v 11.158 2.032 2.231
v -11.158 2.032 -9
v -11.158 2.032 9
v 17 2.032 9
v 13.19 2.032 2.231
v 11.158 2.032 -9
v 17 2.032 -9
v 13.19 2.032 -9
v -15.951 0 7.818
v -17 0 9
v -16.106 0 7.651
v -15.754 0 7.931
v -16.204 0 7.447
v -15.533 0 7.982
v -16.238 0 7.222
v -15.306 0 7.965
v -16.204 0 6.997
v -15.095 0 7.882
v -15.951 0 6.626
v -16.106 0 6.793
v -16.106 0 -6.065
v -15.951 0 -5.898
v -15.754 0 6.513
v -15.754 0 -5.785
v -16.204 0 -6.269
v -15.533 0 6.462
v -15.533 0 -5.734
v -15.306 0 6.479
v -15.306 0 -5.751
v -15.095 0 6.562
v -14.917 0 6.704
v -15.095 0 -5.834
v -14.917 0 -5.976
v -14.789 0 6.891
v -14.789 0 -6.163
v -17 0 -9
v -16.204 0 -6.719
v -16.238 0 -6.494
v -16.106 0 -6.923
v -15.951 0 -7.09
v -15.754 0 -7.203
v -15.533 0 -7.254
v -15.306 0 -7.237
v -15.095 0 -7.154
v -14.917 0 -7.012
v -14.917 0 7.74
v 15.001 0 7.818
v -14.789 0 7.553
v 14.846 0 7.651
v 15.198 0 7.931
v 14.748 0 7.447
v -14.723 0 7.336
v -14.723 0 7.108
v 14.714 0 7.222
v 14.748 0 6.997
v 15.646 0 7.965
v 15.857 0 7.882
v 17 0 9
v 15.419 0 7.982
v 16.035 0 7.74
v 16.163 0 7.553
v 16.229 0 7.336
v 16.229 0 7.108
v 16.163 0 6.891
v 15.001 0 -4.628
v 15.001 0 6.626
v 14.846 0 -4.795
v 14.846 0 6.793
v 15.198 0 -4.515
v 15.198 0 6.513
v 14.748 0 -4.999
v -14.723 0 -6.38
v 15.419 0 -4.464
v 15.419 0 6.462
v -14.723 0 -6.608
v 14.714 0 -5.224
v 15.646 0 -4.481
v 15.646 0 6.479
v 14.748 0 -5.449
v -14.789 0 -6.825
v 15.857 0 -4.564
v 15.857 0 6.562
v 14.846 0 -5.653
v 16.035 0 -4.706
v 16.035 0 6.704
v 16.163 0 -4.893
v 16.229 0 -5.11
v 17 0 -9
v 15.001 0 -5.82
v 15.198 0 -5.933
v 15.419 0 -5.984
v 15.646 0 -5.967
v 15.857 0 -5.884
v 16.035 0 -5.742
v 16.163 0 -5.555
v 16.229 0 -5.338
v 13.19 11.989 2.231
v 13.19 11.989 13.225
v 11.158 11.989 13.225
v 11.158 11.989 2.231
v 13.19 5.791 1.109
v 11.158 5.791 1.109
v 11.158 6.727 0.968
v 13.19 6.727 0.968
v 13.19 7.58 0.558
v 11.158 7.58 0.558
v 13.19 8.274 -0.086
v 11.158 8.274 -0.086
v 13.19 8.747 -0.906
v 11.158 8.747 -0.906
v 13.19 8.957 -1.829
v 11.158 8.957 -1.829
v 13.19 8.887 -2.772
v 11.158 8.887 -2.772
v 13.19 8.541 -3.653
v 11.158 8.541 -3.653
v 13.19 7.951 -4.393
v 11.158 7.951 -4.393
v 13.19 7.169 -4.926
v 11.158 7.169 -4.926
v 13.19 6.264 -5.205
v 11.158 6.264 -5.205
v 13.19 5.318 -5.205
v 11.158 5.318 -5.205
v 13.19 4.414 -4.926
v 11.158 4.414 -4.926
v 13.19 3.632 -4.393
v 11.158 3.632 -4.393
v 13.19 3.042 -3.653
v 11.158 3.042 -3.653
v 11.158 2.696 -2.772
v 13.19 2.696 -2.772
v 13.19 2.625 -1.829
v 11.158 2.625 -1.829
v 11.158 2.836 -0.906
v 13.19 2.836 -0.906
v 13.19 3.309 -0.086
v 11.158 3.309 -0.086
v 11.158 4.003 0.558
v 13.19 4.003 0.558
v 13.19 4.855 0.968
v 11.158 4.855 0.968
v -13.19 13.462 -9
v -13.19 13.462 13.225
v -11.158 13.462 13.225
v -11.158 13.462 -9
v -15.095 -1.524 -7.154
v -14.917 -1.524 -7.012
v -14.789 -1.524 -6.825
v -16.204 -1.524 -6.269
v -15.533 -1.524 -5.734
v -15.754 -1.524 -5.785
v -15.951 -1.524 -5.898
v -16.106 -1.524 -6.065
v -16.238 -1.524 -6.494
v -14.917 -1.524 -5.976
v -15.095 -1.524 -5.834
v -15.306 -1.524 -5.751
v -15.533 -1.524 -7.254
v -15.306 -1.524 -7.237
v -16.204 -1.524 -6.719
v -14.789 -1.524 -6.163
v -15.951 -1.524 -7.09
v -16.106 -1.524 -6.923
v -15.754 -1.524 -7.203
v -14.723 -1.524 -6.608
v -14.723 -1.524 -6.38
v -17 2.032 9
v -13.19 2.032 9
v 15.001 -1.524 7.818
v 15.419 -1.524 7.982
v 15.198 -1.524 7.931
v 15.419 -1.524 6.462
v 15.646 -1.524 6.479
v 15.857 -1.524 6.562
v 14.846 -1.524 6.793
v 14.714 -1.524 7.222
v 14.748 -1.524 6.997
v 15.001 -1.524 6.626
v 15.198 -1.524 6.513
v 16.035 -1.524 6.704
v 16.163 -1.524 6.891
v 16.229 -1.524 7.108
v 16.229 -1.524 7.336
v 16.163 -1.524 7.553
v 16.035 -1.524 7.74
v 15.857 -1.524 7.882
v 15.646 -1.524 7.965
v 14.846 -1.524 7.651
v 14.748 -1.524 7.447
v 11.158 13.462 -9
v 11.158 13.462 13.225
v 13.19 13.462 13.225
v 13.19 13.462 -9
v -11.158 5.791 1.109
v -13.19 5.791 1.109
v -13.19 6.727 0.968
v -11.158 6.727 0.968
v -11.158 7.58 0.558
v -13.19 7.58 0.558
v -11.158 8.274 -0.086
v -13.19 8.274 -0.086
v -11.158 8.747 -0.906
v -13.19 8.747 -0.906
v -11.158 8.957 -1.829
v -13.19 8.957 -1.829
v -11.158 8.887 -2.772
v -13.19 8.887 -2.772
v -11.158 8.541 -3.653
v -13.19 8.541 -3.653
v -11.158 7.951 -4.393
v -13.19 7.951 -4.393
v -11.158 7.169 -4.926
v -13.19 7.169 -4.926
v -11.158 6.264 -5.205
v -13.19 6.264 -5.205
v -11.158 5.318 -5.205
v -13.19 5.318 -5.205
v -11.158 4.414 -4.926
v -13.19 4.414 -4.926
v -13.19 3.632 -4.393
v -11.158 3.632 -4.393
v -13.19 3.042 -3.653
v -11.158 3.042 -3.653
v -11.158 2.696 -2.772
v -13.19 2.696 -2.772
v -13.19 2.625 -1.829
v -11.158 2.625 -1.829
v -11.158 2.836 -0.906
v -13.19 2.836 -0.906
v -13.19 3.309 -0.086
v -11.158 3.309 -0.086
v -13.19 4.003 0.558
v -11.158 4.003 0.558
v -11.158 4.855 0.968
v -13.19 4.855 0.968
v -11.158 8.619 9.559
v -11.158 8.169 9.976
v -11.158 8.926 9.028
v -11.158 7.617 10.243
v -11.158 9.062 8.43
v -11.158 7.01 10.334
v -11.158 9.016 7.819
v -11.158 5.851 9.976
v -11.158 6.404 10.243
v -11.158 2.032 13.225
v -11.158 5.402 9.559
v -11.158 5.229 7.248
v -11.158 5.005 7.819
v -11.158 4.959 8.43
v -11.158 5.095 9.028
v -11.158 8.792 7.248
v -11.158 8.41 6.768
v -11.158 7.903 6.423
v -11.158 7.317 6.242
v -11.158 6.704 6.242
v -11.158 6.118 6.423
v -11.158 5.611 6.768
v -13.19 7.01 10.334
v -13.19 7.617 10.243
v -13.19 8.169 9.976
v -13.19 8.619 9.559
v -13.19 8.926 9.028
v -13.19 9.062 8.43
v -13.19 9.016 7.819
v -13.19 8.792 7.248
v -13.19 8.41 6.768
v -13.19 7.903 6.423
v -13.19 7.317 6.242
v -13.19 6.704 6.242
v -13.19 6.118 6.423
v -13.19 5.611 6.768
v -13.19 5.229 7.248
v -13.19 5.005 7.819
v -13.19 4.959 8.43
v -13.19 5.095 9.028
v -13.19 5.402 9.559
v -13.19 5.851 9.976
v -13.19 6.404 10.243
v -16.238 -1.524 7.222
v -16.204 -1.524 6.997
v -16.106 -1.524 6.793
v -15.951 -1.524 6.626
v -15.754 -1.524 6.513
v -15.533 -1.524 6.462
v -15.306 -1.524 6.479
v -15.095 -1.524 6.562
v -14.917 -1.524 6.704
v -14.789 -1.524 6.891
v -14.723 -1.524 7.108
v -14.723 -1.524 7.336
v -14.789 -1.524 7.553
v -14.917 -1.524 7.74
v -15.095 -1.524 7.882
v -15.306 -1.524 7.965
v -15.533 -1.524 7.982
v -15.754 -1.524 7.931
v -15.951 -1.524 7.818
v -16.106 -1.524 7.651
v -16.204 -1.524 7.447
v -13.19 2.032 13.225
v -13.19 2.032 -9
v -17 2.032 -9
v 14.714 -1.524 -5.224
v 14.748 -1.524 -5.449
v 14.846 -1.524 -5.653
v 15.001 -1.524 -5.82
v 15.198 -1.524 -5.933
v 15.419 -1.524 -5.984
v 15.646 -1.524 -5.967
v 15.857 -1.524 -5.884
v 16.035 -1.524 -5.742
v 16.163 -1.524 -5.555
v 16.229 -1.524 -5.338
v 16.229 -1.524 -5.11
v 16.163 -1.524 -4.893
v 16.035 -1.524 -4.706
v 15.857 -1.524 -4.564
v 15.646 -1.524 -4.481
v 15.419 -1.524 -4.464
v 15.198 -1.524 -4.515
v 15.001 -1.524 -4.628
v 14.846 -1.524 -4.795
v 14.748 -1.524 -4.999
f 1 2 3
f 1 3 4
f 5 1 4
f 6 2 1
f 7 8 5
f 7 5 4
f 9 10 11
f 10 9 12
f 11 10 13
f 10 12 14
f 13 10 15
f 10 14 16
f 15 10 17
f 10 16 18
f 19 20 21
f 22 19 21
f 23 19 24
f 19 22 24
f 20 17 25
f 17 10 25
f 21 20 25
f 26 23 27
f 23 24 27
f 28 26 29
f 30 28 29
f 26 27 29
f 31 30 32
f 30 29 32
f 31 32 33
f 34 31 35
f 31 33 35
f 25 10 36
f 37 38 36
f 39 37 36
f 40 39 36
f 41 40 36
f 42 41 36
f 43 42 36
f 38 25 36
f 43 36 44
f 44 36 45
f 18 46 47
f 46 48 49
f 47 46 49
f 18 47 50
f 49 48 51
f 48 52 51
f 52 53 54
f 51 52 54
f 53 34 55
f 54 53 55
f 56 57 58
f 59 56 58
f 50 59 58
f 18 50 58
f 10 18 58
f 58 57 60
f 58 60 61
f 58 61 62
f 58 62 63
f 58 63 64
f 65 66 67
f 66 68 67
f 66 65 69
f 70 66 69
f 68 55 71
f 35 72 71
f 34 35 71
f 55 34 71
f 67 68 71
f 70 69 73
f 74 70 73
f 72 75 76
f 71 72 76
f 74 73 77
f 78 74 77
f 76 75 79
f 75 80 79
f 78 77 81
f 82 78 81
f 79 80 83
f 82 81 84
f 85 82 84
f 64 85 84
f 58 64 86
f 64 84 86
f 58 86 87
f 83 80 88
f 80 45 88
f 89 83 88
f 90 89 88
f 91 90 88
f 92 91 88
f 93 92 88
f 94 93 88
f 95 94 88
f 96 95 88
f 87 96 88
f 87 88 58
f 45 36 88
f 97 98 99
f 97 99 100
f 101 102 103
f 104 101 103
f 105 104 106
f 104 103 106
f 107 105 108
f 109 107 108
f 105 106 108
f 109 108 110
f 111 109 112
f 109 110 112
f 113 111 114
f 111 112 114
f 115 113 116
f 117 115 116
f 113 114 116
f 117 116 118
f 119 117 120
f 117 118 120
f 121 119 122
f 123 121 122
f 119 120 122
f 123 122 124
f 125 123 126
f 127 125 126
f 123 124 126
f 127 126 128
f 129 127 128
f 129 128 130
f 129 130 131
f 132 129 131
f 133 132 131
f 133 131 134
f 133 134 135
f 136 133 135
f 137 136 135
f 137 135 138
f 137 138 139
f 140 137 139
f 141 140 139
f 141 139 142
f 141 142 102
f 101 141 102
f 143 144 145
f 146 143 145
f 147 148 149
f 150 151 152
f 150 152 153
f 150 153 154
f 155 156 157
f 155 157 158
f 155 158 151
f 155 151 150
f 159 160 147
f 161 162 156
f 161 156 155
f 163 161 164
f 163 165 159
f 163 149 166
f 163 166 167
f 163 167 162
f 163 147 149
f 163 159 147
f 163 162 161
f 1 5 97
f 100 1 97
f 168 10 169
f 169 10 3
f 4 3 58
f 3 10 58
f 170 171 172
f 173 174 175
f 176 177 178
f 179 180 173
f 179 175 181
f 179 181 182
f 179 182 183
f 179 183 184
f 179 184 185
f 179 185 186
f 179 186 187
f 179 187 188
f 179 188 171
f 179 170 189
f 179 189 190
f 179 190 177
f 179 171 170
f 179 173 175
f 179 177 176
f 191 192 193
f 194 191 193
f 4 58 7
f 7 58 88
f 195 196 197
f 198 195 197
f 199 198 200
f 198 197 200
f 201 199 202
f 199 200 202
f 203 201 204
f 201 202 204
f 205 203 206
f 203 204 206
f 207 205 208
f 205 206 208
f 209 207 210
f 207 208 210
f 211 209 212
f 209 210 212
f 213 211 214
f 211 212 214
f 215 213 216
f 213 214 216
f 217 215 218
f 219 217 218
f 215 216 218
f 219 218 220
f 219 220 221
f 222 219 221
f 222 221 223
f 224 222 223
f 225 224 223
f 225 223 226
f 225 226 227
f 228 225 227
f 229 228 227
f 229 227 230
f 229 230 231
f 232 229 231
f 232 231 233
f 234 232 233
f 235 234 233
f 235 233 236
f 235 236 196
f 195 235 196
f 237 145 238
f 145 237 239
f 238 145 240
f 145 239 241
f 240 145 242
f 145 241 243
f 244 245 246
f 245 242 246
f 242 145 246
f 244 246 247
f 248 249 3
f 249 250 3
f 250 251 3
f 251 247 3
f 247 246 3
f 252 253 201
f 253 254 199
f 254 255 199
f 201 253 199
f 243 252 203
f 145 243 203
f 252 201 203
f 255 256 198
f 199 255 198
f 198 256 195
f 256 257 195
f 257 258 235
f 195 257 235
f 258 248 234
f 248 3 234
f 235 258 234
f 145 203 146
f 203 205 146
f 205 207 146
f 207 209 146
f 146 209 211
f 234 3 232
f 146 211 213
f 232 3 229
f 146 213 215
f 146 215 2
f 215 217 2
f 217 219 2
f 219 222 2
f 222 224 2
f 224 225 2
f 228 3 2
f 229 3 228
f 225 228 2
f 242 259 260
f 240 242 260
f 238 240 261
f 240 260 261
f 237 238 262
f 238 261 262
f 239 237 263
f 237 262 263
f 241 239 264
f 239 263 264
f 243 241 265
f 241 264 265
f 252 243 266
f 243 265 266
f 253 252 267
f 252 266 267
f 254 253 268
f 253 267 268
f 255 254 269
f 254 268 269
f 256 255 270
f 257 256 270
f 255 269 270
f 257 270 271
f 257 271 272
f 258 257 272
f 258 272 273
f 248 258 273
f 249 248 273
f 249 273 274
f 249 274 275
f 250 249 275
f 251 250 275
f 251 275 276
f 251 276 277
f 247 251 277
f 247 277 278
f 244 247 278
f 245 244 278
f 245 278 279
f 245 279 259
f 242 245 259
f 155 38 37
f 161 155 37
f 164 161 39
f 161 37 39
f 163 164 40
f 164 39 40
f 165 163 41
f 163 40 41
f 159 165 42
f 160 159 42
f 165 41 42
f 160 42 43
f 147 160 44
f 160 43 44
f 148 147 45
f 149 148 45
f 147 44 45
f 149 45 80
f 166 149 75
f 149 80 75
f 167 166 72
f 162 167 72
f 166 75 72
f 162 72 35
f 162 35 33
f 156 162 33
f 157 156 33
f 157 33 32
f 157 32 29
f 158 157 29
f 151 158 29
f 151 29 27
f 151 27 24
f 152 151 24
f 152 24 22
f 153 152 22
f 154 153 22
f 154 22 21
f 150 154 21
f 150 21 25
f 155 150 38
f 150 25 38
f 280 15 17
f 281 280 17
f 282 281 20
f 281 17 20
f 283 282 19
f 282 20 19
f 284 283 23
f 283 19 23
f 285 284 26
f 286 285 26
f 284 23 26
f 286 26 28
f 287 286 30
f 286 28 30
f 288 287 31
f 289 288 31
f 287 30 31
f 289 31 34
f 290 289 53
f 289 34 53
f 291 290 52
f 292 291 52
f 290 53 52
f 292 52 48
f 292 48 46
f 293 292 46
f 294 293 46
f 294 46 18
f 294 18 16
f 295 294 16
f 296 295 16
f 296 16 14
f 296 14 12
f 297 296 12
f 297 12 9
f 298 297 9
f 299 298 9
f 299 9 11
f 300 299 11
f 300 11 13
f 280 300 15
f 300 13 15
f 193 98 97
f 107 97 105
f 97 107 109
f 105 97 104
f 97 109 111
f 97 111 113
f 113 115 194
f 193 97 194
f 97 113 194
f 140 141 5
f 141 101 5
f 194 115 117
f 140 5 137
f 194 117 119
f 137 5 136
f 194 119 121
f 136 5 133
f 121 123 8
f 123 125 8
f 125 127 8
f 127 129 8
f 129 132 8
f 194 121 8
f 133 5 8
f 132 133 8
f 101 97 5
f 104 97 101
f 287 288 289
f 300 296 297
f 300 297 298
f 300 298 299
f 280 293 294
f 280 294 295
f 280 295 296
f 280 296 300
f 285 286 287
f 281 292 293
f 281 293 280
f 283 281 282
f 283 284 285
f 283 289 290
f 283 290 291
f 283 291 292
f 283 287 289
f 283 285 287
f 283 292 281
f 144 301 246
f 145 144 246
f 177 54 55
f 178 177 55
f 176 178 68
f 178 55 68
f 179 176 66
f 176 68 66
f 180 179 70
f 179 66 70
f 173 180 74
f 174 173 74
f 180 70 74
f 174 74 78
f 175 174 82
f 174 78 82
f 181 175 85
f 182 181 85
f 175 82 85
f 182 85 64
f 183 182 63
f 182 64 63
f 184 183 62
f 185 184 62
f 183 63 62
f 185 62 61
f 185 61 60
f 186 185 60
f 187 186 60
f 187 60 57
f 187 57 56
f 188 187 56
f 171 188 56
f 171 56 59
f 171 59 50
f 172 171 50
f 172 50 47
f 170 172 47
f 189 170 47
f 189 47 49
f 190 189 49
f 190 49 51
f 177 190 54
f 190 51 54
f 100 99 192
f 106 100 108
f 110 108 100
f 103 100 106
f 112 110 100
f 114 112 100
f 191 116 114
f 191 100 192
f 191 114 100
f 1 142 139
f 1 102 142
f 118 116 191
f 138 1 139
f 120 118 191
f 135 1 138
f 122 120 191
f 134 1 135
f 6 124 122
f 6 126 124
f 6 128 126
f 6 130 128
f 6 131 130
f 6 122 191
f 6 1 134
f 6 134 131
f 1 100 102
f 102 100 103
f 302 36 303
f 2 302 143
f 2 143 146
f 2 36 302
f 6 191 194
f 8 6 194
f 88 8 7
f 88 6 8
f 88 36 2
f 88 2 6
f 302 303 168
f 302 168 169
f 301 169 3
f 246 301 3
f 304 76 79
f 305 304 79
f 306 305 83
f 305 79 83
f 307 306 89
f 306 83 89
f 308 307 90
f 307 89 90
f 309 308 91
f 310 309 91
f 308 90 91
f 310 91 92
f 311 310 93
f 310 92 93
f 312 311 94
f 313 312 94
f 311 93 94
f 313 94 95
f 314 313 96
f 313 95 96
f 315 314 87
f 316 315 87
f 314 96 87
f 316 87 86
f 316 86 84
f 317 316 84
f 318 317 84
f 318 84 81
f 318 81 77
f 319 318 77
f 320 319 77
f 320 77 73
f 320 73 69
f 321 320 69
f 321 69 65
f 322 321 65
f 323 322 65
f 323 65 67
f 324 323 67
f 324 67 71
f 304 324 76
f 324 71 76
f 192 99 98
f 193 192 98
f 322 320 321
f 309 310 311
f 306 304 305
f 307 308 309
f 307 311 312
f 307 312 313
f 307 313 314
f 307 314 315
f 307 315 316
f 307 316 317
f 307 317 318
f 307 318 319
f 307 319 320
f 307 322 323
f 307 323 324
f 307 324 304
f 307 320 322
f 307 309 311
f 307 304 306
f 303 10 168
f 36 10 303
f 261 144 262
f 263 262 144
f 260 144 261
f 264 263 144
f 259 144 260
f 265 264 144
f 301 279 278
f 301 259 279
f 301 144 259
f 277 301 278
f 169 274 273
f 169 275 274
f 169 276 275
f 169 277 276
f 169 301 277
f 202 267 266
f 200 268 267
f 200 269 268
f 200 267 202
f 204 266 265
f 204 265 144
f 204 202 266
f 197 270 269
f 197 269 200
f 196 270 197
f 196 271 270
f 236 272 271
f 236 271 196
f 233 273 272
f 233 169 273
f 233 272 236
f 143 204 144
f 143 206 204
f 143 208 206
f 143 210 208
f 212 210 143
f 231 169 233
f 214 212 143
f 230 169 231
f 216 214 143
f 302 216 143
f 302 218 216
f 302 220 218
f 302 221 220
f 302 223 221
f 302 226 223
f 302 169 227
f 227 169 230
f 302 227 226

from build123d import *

# Parameters (mm, degrees)
SKETCH1_W               = 34
SKETCH1_H               = 18
BOSS_EXTRUDE1_DEPTH     = 2.032
SKETCH2_R               = 0.762
BOSS_EXTRUDE2_DEPTH     = 1.524
SKETCH4_W               = 2.032
SKETCH4_H               = 22.225
BOSS_EXTRUDE3_DEPTH     = 11.43
SKETCH3_R               = 3.175
SKETCH3_R_2             = 2.0574
CUT_EXTRUDE1_DEPTH      = 1
CUT_EXTRUDE1_DEPTH_BACK = 35
SKETCH5_W               = 12.0904
SKETCH5_H               = 9.9568
CUT_EXTRUDE2_DEPTH      = 2.032


with BuildPart() as part:
    # Sketch1 → Boss-Extrude1 (new body)
    with BuildSketch(Plane(origin=(0, 0, 0), x_dir=(1, 0, 0), z_dir=(0, 1, 0))):
        Rectangle(SKETCH1_W, SKETCH1_H)
    extrude(amount=BOSS_EXTRUDE1_DEPTH)

    # Sketch2 → Boss-Extrude2 (add)
    with BuildSketch(Plane(origin=(0, 0, 0), x_dir=(-1, 0, 0), z_dir=(0, -1, 0))):
        with Locations((-15.476, 5.224)):
            Circle(SKETCH2_R)
        with Locations((-15.476, -7.222)):
            Circle(SKETCH2_R)
        with Locations((15.476, -7.222)):
            Circle(SKETCH2_R)
        with Locations((15.476, 6.494)):
            Circle(SKETCH2_R)
    extrude(amount=BOSS_EXTRUDE2_DEPTH)

    # Sketch4 → Boss-Extrude3 (add)
    with BuildSketch(Plane(origin=(0, 2.032, 0), x_dir=(1, 0, 0), z_dir=(0, 1, 0))):
        with Locations((-12.174, -2.1125)):
            Rectangle(SKETCH4_W, SKETCH4_H)
        with Locations((12.174, -2.1125)):
            Rectangle(SKETCH4_W, SKETCH4_H)
    extrude(amount=BOSS_EXTRUDE3_DEPTH)

    # Sketch3 → Cut-Extrude1 (cut, two sides)
    with BuildSketch(Plane.ZY.offset(17)) as cut_extrude1_sk:
        with Locations((-2.0658, 5.7912)):
            Circle(SKETCH3_R)
        with Locations((8.276585961, 7.0104)):
            Circle(SKETCH3_R_2)
    extrude(amount=CUT_EXTRUDE1_DEPTH, mode=Mode.SUBTRACT)
    extrude(cut_extrude1_sk.sketch, amount=-CUT_EXTRUDE1_DEPTH_BACK, mode=Mode.SUBTRACT)

    # Sketch5 → Cut-Extrude2 (cut)
    with BuildSketch(Plane(origin=(13.19, 0, 0), x_dir=(0, 0, -1), z_dir=(1, 0, 0))):
        with Locations((-8.276585961, 7.0104)):
            Rectangle(SKETCH5_W, SKETCH5_H)
    extrude(amount=-CUT_EXTRUDE2_DEPTH, mode=Mode.SUBTRACT)


solid = part.part
